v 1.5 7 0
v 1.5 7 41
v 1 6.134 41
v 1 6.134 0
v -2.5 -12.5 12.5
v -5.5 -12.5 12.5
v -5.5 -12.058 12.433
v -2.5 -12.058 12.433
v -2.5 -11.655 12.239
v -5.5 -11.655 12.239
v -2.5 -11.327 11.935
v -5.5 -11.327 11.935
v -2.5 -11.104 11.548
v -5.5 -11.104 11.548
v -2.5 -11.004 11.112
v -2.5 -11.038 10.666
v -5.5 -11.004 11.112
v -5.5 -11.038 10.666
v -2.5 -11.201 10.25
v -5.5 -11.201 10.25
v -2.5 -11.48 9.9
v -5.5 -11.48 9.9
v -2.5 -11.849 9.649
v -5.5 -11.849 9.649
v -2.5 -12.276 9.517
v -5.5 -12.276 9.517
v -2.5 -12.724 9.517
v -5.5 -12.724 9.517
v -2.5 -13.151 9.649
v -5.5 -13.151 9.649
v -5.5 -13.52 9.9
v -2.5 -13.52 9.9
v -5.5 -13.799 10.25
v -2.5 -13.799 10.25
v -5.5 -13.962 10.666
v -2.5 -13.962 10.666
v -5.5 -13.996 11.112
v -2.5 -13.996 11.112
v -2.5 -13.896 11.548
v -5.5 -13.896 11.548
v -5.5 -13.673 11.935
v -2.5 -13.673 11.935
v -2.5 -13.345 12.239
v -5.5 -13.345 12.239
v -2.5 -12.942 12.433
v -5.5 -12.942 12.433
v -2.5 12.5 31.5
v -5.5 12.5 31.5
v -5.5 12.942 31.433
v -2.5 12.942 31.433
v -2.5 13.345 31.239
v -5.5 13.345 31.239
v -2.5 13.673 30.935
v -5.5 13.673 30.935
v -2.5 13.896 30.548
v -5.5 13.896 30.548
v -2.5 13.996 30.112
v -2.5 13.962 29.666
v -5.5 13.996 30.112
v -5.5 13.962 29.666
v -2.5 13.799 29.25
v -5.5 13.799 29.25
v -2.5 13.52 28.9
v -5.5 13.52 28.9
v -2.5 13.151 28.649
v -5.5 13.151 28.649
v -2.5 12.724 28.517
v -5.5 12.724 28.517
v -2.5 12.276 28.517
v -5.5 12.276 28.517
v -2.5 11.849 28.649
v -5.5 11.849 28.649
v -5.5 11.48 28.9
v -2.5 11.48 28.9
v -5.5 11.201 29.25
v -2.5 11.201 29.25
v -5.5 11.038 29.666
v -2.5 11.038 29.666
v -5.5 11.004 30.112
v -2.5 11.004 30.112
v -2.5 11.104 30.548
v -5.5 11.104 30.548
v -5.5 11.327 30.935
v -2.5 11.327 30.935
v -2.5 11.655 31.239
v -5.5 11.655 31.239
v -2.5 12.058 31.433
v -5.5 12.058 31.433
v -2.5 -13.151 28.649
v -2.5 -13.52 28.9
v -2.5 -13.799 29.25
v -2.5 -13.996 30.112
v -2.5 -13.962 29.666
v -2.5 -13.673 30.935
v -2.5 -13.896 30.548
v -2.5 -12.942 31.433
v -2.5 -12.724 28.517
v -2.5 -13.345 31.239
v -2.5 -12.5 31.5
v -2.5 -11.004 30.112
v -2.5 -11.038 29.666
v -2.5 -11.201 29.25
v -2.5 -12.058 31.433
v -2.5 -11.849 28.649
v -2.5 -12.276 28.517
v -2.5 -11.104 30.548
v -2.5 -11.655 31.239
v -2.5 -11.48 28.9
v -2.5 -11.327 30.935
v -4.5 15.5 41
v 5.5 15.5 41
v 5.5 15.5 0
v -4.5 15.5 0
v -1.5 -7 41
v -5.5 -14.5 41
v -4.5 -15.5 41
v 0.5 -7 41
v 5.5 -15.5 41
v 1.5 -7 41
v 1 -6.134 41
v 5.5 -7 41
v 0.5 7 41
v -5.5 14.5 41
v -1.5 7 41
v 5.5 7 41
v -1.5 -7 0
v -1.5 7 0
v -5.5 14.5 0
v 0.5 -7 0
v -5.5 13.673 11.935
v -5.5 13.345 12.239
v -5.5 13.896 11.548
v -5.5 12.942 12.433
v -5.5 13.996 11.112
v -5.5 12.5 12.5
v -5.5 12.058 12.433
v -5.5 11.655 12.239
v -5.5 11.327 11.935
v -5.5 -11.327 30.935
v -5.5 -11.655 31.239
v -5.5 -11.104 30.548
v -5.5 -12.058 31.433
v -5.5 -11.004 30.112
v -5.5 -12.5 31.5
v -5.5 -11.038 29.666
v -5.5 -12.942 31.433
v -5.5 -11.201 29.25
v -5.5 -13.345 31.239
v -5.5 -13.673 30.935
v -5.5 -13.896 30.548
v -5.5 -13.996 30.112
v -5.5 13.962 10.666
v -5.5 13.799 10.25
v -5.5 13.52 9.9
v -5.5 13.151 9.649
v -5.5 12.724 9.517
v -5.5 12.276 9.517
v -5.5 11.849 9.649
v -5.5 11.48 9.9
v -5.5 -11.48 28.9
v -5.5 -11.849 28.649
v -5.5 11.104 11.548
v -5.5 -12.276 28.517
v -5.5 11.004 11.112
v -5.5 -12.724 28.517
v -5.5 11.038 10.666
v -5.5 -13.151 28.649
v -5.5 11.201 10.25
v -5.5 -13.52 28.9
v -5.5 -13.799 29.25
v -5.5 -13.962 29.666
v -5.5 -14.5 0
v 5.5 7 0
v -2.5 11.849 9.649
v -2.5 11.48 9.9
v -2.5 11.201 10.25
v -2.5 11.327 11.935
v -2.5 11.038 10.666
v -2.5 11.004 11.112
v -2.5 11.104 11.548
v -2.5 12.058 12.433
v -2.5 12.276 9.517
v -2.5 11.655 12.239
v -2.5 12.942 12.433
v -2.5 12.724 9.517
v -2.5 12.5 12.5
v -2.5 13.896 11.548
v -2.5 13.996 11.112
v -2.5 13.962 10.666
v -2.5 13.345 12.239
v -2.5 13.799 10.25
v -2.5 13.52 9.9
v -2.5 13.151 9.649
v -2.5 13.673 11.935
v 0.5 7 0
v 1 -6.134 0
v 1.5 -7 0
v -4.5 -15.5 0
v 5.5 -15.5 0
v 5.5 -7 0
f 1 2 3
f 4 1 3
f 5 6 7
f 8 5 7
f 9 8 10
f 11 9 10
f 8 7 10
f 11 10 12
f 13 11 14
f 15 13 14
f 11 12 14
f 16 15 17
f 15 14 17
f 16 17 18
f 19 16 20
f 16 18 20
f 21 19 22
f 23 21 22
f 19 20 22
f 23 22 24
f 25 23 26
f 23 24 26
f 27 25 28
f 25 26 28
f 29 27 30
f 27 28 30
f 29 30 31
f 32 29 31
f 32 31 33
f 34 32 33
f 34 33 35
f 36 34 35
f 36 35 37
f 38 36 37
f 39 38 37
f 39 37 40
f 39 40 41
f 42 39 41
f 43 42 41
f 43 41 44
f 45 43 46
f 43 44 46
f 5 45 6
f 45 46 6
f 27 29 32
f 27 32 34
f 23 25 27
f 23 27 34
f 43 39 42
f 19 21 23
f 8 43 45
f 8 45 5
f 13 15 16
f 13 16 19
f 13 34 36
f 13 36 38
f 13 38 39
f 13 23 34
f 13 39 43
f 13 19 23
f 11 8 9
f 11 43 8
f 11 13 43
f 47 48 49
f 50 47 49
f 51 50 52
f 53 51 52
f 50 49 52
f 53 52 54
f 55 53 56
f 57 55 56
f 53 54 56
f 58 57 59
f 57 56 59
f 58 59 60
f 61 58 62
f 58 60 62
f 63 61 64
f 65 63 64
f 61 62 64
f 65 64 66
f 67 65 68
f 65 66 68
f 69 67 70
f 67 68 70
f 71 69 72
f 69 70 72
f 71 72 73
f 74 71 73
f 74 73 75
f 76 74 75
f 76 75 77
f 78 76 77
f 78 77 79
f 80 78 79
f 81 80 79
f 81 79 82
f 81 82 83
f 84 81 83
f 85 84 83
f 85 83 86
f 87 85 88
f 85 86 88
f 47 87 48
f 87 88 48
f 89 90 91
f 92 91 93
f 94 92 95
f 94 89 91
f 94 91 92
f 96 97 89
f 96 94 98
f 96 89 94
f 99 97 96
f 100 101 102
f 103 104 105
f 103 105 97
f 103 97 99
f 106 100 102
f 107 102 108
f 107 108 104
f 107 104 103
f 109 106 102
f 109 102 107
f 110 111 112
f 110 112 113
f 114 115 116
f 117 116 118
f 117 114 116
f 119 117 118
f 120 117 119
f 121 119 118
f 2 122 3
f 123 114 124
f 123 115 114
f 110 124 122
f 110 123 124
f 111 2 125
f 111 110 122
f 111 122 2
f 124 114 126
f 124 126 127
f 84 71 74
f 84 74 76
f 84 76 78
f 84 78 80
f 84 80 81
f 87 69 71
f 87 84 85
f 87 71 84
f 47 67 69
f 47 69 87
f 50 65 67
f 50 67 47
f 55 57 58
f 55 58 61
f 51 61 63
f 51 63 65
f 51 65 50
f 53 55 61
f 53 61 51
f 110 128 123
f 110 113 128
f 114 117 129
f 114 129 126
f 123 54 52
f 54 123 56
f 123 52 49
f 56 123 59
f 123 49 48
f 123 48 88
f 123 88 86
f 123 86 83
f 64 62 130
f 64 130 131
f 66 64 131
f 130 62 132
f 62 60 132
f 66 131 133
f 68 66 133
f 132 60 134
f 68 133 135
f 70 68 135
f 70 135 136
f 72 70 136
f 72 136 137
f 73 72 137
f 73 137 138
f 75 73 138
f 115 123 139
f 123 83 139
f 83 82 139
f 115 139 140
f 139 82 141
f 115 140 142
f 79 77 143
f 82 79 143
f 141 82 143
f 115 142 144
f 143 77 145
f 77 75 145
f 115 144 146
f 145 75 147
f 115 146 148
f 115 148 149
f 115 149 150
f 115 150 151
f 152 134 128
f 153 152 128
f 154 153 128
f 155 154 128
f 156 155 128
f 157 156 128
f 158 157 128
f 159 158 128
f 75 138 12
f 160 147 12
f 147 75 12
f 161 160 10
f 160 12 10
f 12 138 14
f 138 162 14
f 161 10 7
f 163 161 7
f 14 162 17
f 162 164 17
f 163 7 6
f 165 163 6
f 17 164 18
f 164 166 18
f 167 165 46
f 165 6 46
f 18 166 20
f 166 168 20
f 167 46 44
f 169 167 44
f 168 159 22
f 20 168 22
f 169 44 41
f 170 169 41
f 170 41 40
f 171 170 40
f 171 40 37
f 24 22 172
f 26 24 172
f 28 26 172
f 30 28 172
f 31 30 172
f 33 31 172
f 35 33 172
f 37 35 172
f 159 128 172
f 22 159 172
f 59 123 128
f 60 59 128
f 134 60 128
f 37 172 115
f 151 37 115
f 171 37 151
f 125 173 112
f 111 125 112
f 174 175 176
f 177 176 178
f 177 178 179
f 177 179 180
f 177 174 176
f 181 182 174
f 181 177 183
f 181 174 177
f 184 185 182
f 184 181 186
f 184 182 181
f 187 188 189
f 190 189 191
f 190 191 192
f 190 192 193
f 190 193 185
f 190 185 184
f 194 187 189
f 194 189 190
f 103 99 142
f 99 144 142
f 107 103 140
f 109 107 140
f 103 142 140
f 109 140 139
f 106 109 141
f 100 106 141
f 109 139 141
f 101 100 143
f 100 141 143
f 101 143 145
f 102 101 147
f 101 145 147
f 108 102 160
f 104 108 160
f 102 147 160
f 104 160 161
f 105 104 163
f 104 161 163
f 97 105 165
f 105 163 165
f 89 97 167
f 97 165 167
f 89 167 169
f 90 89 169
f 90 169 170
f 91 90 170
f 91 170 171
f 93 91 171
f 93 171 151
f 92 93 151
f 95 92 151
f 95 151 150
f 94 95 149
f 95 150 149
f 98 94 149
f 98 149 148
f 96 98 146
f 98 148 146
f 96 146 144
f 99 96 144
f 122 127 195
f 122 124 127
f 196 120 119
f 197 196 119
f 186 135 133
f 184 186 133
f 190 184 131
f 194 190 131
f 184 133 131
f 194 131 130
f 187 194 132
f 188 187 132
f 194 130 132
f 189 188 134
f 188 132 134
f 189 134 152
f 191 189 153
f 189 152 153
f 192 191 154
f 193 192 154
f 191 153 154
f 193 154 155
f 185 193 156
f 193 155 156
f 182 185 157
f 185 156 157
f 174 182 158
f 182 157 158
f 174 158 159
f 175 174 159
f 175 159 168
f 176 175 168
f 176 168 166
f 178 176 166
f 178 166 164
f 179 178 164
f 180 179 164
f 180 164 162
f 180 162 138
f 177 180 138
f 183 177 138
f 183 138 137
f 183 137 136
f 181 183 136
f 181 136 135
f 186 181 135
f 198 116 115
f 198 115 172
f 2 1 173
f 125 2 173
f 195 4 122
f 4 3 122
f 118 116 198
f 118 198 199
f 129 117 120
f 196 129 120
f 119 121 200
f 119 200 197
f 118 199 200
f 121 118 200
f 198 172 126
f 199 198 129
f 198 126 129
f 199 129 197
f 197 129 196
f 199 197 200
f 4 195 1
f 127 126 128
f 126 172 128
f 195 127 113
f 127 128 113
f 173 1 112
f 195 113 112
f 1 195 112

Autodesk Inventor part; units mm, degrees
ref_plane "YZ Plane" through (0, 0, 0) normal (1, 0, 0) x (0, 1, 0)
ref_plane "XZ Plane" through (0, 0, 0) normal (0, 1, 0) x (-1, 0, 0)
ref_plane "XY Plane" through (0, 0, 0) normal (0, 0, 1) x (1, 0, 0)
sketch "Sketch1" plane through (0, 0, 0) normal (0, 0, 1) x (1, 0, 0)
  line L0 (-5.5, -15.5) -> (5.5, -15.5)
  line L1 (5.5, -15.5) -> (5.5, 15.5)
  line L2 (5.5, 15.5) -> (-5.5, 15.5)
  line L3 (-5.5, 15.5) -> (-5.5, -15.5)
  line L4 (0, 0) -> (3.6847, 0)
  line L5 (0, 0) -> (0, -8.9349)
  point P0 (5.5, 0)
  point P1 (0, -15.5)
  dimension "d0" = 11
  dimension "d1" = 31
extrude "Extrusion1" add sketch "Sketch1" along normal blind 41
sketch "Sketch2" plane through (0, 0, 41) normal (0, 0, 1) x (1, 0, 0)
  line L0 (5.5, -15.5) -> (5.5, 15.5) projected
  line L1 (5.5, -7) -> (-1.5, -7)
  line L2 (-1.5, -7) -> (-1.5, 7)
  line L3 (-1.5, 7) -> (5.5, 7)
  line L4 (5.5, 7) -> (5.5, -7)
  point P0 (0, 0)
  point P1 (5.5, 0)
  dimension "d4" = 7
  dimension "d5" = 14
extrude "Extrusion2" cut sketch "Sketch2" against normal through all
sketch "Sketch3" plane through (0, 0, 41) normal (0, 0, 1) x (1, 0, 0)
  line L0 (-1.5, 7) -> (5.5, 7) projected
  line L1 (5.5, -7) -> (-1.5, -7) projected
  line L2 (1, 6.134) -> (0.5, 7) projected
  line L3 (0.5, 7) -> (-1.5, 7) projected
  line L4 (-1.5, -7) -> (-1.5, 7) projected
  line L5 (0.5, -7) -> (-1.5, -7) projected
  line L6 (0.5, -7) -> (1, -6.134) projected
  line L7 (1, -6.134) -> (1.5, -7) projected
  line L8 (7.5, -7) -> (1.5, -7) projected
  line L9 (7.5, 7) -> (7.5, -7) projected
  line L10 (7.5, 7) -> (1.5, 7) projected
  line L11 (1.5, 7) -> (1, 6.134) projected
  line L12 (0.5, 7) -> (1.5, 7)
  line L13 (1.5, 7) -> (1, 6.134)
  line L14 (1, 6.134) -> (0.5, 7)
  line L15 (1, -6.134) -> (1.5, -7)
  line L16 (1.5, -7) -> (0.5, -7)
  line L17 (0.5, -7) -> (1, -6.134)
  point P0 (0, 0)
  point P1 (1, 6.7113)
  point P2 (1, -6.7113)
  dimension "d8" = 1
  dimension "d9" = 1
  dimension "d10" = 2
  dimension "d11" = 2
extrude "Extrusion3" add sketch "Sketch3" against normal up to surface (41 mm away) contours L0 L11 L2 | L6 L7 L1
sketch "Sketch4" plane through (-5.5, -15.5, 0) normal (-1, 0, 0) x (0, 0, 1)
  line L0 (0, 0) -> (41, 0) projected
  line L1 (41, 31) -> (41, 0) projected
  line L2 (0, 31) -> (41, 31) projected
  circle A0 centre (30, 3) radius 1.5
  line L3 (41, 15.5) -> (23.6881, 15.5)
  line L4 (20.5, 31) -> (20.5, 20.567)
  circle A1 centre (30, 28) radius 1.5
  circle A2 centre (11, 3) radius 1.5
  circle A3 centre (11, 28) radius 1.5
  point P0 (0, 15.5)
  dimension "d14" = 3
  dimension "d15" = 3
  dimension "d16" = 11
extrude "Extrusion4" cut sketch "Sketch4" against normal blind 3
chamfer "Chamfer1" distance 1 angle 45 2 edges at (-5.5, -15.5, 20.5) (-5.5, 15.5, 20.5)
properties part number "Pen_Holder" material "Steel, Wrought"
